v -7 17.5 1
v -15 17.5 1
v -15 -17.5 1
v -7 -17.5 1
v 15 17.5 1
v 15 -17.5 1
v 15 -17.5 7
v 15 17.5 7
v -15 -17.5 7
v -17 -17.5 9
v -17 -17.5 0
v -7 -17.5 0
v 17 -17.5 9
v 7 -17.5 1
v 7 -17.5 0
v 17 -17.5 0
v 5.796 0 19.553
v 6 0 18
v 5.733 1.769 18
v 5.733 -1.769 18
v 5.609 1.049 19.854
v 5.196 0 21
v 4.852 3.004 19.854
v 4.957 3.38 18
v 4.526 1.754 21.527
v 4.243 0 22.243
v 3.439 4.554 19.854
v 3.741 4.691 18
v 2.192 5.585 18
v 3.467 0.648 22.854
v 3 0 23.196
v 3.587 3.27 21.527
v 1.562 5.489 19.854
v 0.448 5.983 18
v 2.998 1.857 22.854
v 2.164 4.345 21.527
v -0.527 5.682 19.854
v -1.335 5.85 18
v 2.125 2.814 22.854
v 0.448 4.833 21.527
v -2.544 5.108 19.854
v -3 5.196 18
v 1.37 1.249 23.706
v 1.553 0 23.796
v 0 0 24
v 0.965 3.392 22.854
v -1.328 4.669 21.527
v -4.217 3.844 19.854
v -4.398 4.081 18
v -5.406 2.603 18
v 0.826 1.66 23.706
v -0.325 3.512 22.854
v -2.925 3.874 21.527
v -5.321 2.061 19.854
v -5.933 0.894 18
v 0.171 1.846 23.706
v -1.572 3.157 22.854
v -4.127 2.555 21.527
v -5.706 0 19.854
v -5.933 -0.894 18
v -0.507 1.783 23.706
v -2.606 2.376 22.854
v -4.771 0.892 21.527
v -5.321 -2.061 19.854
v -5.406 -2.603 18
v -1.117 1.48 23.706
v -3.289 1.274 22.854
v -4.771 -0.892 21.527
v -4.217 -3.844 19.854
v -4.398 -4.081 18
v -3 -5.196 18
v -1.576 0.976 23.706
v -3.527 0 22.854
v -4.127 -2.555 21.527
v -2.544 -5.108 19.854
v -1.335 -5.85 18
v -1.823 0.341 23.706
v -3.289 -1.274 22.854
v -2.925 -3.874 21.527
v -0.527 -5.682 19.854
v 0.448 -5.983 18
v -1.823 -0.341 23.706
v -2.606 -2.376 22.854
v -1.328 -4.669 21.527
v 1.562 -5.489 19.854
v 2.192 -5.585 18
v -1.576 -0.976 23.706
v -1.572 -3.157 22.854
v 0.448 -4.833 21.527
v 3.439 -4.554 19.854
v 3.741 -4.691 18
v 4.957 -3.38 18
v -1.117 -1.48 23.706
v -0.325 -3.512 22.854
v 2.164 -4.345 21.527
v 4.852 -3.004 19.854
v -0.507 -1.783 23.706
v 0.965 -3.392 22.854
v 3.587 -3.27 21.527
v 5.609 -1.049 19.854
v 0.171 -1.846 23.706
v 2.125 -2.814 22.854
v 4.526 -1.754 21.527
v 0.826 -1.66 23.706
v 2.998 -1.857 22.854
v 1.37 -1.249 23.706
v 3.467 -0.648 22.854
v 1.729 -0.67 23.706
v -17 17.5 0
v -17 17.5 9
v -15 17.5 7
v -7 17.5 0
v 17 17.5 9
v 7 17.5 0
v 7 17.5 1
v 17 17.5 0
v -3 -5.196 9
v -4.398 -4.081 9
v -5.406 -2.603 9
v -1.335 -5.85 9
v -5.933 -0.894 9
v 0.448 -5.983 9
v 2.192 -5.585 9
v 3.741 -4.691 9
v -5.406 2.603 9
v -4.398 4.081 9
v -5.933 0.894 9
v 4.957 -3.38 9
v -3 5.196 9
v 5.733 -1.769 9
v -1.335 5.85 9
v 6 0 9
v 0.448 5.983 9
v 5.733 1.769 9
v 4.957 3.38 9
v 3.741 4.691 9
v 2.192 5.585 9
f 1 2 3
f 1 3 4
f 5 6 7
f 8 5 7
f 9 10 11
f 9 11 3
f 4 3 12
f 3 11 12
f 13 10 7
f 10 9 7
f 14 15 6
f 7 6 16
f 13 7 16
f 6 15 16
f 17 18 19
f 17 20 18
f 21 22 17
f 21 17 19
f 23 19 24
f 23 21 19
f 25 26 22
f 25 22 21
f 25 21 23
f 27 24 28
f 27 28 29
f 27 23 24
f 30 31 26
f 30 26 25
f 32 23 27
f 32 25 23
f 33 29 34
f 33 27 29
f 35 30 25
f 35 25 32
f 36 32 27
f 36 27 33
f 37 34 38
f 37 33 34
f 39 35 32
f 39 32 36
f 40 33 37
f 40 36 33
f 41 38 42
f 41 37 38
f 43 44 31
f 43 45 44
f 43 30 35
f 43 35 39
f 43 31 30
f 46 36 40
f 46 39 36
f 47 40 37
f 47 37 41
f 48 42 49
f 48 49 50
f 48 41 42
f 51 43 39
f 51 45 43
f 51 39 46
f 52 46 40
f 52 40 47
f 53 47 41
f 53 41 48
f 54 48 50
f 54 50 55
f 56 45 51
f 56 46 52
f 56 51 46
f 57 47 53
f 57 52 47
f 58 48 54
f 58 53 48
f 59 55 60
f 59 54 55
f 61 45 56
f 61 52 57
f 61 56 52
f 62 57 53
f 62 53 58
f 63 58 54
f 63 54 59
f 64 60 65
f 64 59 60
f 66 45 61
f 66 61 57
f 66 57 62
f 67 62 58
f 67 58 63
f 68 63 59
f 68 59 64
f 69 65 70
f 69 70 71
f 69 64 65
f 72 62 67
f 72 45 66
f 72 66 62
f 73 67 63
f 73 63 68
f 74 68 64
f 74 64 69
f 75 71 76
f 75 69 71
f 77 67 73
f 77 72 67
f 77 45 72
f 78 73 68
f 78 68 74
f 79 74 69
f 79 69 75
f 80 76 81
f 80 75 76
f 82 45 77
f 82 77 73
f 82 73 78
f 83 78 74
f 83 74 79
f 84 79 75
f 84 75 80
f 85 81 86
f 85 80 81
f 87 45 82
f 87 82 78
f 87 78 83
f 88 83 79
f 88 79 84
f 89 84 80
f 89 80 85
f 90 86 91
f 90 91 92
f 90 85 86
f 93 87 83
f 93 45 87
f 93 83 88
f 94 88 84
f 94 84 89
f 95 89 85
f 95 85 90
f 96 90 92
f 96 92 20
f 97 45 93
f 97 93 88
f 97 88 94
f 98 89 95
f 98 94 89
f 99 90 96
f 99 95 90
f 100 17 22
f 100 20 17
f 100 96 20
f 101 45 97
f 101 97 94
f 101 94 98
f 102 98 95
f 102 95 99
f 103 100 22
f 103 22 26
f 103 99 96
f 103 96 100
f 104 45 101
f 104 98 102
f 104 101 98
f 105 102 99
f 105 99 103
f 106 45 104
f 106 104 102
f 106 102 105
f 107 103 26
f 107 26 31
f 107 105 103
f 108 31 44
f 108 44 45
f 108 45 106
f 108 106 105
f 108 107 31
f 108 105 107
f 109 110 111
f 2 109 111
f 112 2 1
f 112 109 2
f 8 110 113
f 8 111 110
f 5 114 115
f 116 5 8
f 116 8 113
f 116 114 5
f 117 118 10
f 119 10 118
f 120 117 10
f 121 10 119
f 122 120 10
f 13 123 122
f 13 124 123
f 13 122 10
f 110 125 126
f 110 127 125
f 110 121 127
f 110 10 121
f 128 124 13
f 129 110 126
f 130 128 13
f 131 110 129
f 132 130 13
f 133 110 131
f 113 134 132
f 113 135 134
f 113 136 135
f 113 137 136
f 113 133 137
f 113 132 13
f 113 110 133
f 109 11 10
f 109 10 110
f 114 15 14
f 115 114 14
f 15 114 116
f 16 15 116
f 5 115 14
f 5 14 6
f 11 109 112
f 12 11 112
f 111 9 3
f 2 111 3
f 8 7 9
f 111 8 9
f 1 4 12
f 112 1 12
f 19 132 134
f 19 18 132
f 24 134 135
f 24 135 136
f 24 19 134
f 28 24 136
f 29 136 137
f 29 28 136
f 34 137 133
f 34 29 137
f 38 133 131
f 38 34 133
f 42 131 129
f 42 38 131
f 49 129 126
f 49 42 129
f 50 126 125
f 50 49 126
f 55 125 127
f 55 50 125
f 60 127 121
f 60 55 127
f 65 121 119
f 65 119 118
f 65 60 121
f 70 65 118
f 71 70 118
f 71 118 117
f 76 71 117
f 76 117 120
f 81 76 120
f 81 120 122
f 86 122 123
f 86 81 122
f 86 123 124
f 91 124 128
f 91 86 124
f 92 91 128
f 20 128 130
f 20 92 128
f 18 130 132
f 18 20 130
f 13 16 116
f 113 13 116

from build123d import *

# Parameters (mm, degrees)
F0_W     = 34
F0_H     = 35
F1_DEPTH = 9
F3_DEPTH = 56.9500997663
F4_W     = 6
F4_H     = 9


with BuildPart() as f1:
    # F0 (on Top) → F1 (new body)
    with BuildSketch(Plane.XY):
        Rectangle(F0_W, F0_H)
    extrude(amount=F1_DEPTH)

    # F2 (on face) → F3 (cut)
    with BuildSketch(Plane.XZ.offset(17.5)):
        Polygon((-7, 1), (-7, 0), (0, 0), (0, 7), (-15, 7), (-15, 1), align=None)
        Polygon((0, 7), (0, 0), (7, 0), (7, 1), (15, 1), (15, 7), align=None)
    extrude(amount=-F3_DEPTH, mode=Mode.SUBTRACT)

    # F4 (on Front) → F6 (revolve)
    with BuildSketch(Plane.XZ):
        with Locations((3, 13.5)):
            Rectangle(F4_W, F4_H)
        with BuildLine():
            Line((0, 18), (6, 18))
            ThreePointArc((6, 18), (4.2426406871, 22.2426406871), (0, 24))
            Line((0, 24), (0, 18))
        make_face()
    revolve(axis=Axis((0, 0, 0), (0, 0, 1)))


solid = f1.part
